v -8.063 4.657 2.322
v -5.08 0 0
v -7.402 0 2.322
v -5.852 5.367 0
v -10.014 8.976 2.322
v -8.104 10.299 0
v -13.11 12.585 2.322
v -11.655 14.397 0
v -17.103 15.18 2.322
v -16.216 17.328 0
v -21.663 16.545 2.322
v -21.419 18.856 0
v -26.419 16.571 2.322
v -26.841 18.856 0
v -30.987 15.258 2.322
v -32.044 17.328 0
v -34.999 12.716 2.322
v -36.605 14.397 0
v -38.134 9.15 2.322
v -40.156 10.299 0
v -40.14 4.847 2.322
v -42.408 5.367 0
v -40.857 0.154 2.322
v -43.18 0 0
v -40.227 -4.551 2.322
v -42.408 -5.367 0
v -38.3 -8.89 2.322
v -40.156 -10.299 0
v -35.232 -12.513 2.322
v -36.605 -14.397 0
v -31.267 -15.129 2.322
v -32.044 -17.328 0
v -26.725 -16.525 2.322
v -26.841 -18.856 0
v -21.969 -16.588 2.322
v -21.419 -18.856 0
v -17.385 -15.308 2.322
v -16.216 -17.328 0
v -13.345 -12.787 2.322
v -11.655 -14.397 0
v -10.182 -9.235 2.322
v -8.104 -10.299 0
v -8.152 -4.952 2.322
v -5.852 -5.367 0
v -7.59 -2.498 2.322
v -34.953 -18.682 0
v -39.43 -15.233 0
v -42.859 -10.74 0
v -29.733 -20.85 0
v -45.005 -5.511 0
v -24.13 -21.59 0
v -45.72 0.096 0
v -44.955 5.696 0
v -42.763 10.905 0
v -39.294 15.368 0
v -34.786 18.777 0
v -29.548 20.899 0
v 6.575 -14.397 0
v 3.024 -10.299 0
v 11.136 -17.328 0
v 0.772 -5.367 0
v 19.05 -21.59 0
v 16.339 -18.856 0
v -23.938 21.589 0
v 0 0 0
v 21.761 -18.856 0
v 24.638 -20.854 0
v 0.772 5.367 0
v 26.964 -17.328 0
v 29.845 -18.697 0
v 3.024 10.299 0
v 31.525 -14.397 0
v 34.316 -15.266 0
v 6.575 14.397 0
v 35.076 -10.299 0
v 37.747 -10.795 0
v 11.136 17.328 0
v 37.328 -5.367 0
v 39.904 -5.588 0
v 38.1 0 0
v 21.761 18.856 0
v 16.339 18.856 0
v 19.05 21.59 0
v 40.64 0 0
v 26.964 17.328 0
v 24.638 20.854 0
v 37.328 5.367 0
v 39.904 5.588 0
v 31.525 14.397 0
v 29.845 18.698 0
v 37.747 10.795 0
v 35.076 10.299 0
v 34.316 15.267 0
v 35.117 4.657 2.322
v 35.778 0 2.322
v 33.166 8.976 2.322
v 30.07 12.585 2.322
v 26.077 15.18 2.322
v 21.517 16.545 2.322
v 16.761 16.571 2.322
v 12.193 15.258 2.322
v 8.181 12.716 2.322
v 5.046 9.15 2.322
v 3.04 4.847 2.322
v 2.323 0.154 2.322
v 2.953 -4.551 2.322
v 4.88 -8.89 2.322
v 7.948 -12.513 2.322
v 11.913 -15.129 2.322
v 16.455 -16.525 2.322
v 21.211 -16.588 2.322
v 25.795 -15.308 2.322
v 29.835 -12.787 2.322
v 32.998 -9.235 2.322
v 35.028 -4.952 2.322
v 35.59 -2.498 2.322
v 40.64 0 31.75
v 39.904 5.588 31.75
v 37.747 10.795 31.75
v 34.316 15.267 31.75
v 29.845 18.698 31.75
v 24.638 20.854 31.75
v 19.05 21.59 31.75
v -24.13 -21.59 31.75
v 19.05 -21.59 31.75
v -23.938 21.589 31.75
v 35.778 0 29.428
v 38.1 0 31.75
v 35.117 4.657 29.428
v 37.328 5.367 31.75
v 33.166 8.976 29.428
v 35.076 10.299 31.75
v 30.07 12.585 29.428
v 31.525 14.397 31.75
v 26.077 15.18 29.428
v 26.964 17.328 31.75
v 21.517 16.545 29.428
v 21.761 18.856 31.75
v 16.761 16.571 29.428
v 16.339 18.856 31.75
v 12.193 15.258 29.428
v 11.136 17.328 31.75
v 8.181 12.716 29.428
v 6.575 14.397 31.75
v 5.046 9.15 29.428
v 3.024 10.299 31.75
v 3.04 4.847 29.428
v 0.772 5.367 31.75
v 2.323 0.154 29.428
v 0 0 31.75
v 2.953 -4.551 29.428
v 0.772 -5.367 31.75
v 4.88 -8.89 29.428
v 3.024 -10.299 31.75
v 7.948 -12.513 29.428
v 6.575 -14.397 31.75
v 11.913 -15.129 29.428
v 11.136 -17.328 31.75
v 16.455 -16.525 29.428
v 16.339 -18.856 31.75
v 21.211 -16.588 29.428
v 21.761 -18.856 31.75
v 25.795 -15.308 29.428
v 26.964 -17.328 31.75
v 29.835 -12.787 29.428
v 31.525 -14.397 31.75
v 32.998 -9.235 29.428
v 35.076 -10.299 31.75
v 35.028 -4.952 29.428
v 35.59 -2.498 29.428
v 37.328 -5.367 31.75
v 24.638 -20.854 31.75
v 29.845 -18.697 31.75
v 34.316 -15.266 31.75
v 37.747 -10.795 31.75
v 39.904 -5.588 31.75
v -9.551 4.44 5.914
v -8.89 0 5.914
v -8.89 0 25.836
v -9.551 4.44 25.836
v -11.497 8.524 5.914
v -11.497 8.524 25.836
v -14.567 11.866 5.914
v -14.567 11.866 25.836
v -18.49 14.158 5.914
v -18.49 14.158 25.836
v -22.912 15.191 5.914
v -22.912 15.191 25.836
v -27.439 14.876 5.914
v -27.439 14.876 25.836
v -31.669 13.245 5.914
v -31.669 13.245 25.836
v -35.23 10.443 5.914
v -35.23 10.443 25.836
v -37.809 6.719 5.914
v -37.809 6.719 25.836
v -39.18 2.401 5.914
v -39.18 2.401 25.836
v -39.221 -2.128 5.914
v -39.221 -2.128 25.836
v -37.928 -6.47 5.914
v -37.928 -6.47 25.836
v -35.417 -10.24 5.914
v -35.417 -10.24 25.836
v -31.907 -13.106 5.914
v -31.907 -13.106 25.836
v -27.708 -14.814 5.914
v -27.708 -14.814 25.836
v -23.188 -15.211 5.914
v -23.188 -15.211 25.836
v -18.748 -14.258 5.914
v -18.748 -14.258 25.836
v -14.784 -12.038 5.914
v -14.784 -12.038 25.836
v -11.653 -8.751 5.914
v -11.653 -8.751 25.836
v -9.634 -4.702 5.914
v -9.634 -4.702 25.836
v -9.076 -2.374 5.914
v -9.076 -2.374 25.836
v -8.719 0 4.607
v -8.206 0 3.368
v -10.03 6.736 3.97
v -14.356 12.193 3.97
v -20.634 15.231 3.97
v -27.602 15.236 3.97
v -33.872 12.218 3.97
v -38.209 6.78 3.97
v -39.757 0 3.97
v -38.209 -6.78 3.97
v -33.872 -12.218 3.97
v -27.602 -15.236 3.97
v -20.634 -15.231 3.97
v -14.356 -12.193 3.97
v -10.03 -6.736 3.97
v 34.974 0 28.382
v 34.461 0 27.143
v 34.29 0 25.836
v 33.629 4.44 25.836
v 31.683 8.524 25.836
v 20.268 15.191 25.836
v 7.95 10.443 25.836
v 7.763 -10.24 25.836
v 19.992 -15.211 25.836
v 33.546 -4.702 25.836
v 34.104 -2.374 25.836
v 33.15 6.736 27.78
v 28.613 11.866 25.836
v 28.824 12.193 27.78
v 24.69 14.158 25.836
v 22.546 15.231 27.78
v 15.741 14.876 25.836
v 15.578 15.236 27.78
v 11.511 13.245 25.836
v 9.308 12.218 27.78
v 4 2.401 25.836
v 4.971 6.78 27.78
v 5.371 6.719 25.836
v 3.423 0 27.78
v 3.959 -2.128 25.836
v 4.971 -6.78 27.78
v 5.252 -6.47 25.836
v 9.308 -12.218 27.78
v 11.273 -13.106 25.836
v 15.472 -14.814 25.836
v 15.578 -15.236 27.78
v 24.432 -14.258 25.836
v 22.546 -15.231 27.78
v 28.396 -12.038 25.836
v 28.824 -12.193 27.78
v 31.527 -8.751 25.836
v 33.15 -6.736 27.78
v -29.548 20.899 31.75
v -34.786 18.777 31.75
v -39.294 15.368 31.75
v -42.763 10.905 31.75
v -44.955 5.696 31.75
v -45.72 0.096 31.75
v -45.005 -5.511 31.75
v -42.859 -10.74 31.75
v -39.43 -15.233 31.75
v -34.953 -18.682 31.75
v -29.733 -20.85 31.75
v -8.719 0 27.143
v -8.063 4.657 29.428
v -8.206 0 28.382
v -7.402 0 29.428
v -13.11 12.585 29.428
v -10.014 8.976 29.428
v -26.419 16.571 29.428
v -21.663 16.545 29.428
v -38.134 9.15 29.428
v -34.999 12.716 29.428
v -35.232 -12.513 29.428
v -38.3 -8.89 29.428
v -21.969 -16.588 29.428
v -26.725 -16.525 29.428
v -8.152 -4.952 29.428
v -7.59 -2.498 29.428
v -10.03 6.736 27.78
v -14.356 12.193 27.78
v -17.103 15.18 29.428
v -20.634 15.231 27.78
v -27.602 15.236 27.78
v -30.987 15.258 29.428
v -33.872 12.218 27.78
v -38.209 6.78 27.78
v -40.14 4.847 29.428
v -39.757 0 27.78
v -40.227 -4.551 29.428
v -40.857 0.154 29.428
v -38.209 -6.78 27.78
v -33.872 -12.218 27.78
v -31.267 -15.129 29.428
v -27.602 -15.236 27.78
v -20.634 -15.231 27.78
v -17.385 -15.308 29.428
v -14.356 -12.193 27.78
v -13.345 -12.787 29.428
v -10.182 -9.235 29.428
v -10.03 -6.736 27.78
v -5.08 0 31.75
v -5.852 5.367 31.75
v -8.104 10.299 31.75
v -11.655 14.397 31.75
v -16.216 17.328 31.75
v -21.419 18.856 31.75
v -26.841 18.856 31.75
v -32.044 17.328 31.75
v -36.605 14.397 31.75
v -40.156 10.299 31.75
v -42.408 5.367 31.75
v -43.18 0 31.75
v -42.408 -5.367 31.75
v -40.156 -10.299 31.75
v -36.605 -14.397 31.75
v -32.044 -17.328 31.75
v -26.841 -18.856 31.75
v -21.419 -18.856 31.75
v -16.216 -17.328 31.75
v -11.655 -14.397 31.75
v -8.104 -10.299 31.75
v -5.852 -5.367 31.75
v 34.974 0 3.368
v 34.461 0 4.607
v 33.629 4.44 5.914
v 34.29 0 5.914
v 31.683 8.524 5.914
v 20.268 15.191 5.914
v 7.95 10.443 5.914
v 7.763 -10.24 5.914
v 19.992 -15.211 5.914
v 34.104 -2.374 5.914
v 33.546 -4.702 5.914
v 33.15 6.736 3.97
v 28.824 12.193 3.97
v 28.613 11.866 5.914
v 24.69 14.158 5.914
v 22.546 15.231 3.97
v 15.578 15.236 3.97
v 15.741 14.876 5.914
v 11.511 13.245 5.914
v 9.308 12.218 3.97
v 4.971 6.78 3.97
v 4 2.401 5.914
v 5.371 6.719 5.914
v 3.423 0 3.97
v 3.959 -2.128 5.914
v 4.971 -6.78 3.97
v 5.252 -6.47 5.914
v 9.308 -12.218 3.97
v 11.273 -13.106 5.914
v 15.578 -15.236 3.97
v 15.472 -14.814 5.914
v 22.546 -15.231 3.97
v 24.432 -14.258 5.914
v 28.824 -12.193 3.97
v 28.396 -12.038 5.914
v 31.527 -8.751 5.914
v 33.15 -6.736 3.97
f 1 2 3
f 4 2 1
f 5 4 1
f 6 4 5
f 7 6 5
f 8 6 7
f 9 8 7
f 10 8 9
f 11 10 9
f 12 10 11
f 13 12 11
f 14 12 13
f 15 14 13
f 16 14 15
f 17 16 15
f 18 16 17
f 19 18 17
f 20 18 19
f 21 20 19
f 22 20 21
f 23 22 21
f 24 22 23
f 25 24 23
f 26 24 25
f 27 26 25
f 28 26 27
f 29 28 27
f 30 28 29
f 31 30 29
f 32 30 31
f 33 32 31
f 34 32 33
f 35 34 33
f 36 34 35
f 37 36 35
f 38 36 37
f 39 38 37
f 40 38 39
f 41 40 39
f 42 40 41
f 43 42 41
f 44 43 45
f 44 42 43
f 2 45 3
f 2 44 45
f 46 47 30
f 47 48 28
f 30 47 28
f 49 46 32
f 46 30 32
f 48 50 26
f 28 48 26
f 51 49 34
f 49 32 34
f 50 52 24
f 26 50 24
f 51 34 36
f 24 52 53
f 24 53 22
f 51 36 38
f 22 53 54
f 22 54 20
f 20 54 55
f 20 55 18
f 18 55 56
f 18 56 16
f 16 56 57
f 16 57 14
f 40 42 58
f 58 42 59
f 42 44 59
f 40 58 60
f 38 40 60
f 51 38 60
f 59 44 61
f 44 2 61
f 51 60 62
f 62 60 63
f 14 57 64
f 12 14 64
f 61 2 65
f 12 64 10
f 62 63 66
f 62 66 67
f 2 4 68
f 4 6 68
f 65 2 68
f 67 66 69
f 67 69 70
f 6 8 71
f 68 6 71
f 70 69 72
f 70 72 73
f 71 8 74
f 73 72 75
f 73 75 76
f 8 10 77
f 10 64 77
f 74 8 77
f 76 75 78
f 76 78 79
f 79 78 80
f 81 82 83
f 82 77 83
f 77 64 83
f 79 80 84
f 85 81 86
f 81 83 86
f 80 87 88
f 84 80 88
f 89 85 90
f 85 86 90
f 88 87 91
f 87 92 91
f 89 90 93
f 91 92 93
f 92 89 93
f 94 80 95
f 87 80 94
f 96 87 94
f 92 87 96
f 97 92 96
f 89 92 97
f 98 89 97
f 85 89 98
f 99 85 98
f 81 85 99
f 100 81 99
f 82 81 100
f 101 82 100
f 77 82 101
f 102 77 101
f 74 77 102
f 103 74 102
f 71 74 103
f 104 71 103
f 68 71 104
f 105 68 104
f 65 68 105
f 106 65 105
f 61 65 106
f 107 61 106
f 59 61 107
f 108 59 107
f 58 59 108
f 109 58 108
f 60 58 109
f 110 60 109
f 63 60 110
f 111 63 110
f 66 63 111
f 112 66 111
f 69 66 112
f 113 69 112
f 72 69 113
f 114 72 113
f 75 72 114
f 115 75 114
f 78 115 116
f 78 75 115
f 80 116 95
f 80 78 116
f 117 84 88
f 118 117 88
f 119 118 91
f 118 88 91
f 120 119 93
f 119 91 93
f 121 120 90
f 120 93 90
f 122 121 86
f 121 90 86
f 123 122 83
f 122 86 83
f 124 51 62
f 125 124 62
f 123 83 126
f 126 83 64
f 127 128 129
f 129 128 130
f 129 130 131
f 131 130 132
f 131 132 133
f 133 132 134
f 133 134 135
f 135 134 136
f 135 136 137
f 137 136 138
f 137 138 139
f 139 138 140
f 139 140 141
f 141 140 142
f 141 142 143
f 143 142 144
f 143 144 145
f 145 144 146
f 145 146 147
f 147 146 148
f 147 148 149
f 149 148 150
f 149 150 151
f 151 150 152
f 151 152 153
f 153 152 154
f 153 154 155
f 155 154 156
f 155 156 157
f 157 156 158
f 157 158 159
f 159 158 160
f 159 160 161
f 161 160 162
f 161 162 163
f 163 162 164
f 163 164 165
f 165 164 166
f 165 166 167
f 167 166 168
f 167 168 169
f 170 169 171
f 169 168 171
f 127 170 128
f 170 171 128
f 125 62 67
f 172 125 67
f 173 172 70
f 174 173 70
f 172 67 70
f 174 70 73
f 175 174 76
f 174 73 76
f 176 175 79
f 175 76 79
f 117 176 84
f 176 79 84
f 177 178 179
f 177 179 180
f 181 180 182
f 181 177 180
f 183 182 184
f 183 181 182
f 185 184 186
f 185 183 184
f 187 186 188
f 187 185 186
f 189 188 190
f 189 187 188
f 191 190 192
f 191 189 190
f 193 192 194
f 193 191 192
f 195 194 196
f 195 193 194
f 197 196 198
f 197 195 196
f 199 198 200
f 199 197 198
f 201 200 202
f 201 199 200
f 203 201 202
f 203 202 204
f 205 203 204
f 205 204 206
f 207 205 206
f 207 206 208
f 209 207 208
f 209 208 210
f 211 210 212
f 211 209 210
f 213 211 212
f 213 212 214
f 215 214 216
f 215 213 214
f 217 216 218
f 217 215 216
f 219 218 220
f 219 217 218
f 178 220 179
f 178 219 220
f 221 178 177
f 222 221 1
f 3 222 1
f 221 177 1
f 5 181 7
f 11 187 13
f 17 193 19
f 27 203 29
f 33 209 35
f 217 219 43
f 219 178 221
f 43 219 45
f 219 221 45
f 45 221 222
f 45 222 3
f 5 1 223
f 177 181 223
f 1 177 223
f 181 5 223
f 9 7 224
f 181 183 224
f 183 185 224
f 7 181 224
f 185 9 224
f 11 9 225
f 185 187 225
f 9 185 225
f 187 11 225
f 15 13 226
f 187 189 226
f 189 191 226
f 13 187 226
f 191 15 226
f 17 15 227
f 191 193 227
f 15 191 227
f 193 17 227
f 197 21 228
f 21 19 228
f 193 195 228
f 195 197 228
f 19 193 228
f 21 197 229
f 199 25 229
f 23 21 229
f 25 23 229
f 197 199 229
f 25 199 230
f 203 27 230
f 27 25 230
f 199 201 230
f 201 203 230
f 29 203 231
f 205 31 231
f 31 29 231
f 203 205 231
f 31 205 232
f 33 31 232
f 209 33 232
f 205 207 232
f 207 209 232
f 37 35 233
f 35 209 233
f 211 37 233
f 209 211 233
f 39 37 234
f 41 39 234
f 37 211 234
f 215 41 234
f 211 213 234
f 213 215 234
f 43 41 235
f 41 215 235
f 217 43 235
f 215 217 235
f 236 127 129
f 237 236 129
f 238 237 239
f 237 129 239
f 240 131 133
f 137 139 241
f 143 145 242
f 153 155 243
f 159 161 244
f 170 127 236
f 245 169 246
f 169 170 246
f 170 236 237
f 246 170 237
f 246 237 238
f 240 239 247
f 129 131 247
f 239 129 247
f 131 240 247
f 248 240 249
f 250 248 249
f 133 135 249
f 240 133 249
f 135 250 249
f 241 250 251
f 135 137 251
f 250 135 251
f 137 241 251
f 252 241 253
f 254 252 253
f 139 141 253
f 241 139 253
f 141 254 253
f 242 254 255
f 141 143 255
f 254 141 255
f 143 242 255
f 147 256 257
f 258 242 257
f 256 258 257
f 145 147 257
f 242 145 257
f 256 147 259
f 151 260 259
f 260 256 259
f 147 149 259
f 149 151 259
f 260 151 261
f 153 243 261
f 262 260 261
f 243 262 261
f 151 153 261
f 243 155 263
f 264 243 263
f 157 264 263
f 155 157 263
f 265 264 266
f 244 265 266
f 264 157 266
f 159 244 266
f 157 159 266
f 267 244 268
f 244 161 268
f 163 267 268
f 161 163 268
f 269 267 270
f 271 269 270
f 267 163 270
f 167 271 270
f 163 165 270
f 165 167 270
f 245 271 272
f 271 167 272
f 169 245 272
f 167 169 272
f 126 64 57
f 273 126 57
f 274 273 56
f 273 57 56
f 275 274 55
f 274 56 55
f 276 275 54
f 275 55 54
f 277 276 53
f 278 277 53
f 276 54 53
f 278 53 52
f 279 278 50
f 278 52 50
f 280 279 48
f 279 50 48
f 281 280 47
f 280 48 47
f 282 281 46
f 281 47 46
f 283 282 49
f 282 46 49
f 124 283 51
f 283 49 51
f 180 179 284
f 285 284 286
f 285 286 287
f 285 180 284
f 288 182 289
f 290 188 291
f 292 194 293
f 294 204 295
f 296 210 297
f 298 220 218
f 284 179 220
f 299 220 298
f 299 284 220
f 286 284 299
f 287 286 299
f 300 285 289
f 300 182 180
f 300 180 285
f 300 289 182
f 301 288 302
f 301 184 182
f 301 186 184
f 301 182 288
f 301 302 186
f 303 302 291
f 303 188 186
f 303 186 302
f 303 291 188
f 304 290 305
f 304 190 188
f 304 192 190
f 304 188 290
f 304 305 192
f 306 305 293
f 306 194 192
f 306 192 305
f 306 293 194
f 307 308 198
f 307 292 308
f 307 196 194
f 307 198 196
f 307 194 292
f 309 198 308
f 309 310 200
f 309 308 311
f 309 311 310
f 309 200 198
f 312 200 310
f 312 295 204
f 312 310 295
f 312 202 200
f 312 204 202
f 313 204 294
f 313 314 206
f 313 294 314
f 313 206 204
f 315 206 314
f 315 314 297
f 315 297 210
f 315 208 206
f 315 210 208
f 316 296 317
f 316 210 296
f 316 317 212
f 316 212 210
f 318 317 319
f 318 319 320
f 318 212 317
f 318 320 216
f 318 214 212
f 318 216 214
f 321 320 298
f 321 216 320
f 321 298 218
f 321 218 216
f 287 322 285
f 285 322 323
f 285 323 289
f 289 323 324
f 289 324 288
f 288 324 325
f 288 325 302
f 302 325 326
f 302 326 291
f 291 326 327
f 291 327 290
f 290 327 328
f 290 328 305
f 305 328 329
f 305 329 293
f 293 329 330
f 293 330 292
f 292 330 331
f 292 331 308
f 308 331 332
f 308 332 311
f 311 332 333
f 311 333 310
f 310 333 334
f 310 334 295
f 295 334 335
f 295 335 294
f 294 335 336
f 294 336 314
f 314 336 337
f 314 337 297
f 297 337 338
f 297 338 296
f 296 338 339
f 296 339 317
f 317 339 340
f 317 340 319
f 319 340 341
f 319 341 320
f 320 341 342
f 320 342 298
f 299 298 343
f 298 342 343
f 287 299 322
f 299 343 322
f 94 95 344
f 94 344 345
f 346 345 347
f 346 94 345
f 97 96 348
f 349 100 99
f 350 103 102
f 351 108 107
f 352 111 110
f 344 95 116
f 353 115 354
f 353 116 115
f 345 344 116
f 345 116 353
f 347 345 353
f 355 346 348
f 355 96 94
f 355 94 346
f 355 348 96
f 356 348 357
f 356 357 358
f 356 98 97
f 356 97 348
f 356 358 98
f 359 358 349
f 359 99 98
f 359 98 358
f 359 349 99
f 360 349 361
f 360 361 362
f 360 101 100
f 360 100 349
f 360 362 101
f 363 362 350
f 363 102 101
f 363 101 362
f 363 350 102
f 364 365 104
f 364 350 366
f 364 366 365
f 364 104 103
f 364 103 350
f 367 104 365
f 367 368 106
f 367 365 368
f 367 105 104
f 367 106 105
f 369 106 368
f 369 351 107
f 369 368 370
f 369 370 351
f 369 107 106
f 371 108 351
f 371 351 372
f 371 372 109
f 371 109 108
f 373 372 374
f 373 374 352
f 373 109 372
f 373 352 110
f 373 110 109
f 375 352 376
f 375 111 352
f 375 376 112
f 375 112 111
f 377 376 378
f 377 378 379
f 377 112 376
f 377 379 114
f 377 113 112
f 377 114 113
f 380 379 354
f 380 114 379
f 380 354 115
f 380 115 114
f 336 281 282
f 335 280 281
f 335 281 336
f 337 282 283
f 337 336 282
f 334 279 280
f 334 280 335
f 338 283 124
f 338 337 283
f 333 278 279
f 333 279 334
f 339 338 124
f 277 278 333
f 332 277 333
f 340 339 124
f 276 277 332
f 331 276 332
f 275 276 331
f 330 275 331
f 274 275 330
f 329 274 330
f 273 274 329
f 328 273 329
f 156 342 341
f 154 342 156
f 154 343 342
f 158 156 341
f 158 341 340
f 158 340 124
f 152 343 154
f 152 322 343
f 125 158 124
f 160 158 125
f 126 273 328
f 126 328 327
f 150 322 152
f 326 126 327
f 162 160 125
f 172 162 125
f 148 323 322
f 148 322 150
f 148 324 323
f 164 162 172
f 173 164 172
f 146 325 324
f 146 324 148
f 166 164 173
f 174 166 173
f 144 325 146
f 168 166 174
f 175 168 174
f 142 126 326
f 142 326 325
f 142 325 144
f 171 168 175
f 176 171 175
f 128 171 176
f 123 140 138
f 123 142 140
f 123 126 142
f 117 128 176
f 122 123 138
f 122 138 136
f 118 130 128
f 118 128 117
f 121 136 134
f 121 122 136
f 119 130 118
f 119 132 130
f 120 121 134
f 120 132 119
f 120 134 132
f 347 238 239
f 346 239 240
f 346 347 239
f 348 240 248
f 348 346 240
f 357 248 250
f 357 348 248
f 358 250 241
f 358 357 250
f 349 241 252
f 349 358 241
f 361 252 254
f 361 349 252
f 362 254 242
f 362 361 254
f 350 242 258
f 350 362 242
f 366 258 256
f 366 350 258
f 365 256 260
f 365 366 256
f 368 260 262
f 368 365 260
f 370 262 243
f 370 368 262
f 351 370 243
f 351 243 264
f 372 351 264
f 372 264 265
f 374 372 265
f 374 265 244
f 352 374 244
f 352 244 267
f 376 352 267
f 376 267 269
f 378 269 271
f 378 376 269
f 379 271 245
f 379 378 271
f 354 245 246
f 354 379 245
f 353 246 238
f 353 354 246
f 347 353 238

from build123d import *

# Parameters (mm, degrees)
F0_R     = 15.24
F1_DEPTH = 31.75
F2_SIZE  = 3.81
F3_R     = 5.08


# Not quite as in the source:
# - a feature names something its author has since deleted; it is built from what else it names


with BuildPart() as f1:
    # F0 (on Top) → F1 (new body)
    with BuildSketch(Plane.XY):
        with BuildLine():
            ThreePointArc((19.05, -21.59), (34.3164354058, -15.2664354058), (40.64, 0))
            ThreePointArc((40.64, 0), (34.316284436, 15.2665863742), (19.0495729948, 21.5899999958))
            ThreePointArc((19.0495729948, 21.5899999958), (3.7834136258, 15.266284436), (-2.54, 0))
            ThreePointArc((-2.54, 0), (3.7835645942, -15.2664354058), (19.05, -21.59))
        make_face()
        with Locations((19.05, 0)):
            Circle(F0_R, mode=Mode.SUBTRACT)
        with BuildLine():
            Line((-24.13, -21.59), (19.05, -21.59))
            ThreePointArc((19.05, -21.59), (3.7835645942, -15.2664354058), (-2.54, 0))
            ThreePointArc((-2.54, 0), (-8.8635645942, -15.2664354058), (-24.13, -21.59))
        make_face()
        with BuildLine():
            ThreePointArc((-24.13, -21.59), (-8.8635645942, -15.2664354058), (-2.54, 0))
            ThreePointArc((-2.54, 0), (-8.7959724103, 15.1985426235), (-23.9383972097, 21.5891497834))
            ThreePointArc((-23.9383972097, 21.5891497834), (-45.7197874448, 0.0958023383), (-24.13, -21.59))
        make_face()
        with Locations((-24.13, 0)):
            Circle(F0_R, mode=Mode.SUBTRACT)
        with BuildLine():
            ThreePointArc((-2.54, 0), (3.7834136258, 15.266284436), (19.0495729948, 21.5899999958))
            Line((19.0495729948, 21.5899999958), (-23.9383972097, 21.5891497834))
            ThreePointArc((-23.9383972097, 21.5891497834), (-8.7959724103, 15.1985426235), (-2.54, 0))
        make_face()
    extrude(amount=F1_DEPTH)

    # F2
    f2_edges = [f1.edges().sort_by_distance(p)[0] for p in [
        (-39.37, 0, 0),
        (3.81, 0, 0),
        (3.81, 0, 31.75),
        (-39.37, 0, 31.75),
    ]]
    chamfer(f2_edges, length=F2_SIZE)

    # F3
    f3_edges = [f1.edges().sort_by_distance(p)[0] for p in [
        (-39.37, 0, 3.81),
        (-39.37, 0, 27.94),
        (3.81, 0, 27.94),
        (3.81, 0, 3.81),
    ]]
    fillet(f3_edges, radius=F3_R)


solid = f1.part
